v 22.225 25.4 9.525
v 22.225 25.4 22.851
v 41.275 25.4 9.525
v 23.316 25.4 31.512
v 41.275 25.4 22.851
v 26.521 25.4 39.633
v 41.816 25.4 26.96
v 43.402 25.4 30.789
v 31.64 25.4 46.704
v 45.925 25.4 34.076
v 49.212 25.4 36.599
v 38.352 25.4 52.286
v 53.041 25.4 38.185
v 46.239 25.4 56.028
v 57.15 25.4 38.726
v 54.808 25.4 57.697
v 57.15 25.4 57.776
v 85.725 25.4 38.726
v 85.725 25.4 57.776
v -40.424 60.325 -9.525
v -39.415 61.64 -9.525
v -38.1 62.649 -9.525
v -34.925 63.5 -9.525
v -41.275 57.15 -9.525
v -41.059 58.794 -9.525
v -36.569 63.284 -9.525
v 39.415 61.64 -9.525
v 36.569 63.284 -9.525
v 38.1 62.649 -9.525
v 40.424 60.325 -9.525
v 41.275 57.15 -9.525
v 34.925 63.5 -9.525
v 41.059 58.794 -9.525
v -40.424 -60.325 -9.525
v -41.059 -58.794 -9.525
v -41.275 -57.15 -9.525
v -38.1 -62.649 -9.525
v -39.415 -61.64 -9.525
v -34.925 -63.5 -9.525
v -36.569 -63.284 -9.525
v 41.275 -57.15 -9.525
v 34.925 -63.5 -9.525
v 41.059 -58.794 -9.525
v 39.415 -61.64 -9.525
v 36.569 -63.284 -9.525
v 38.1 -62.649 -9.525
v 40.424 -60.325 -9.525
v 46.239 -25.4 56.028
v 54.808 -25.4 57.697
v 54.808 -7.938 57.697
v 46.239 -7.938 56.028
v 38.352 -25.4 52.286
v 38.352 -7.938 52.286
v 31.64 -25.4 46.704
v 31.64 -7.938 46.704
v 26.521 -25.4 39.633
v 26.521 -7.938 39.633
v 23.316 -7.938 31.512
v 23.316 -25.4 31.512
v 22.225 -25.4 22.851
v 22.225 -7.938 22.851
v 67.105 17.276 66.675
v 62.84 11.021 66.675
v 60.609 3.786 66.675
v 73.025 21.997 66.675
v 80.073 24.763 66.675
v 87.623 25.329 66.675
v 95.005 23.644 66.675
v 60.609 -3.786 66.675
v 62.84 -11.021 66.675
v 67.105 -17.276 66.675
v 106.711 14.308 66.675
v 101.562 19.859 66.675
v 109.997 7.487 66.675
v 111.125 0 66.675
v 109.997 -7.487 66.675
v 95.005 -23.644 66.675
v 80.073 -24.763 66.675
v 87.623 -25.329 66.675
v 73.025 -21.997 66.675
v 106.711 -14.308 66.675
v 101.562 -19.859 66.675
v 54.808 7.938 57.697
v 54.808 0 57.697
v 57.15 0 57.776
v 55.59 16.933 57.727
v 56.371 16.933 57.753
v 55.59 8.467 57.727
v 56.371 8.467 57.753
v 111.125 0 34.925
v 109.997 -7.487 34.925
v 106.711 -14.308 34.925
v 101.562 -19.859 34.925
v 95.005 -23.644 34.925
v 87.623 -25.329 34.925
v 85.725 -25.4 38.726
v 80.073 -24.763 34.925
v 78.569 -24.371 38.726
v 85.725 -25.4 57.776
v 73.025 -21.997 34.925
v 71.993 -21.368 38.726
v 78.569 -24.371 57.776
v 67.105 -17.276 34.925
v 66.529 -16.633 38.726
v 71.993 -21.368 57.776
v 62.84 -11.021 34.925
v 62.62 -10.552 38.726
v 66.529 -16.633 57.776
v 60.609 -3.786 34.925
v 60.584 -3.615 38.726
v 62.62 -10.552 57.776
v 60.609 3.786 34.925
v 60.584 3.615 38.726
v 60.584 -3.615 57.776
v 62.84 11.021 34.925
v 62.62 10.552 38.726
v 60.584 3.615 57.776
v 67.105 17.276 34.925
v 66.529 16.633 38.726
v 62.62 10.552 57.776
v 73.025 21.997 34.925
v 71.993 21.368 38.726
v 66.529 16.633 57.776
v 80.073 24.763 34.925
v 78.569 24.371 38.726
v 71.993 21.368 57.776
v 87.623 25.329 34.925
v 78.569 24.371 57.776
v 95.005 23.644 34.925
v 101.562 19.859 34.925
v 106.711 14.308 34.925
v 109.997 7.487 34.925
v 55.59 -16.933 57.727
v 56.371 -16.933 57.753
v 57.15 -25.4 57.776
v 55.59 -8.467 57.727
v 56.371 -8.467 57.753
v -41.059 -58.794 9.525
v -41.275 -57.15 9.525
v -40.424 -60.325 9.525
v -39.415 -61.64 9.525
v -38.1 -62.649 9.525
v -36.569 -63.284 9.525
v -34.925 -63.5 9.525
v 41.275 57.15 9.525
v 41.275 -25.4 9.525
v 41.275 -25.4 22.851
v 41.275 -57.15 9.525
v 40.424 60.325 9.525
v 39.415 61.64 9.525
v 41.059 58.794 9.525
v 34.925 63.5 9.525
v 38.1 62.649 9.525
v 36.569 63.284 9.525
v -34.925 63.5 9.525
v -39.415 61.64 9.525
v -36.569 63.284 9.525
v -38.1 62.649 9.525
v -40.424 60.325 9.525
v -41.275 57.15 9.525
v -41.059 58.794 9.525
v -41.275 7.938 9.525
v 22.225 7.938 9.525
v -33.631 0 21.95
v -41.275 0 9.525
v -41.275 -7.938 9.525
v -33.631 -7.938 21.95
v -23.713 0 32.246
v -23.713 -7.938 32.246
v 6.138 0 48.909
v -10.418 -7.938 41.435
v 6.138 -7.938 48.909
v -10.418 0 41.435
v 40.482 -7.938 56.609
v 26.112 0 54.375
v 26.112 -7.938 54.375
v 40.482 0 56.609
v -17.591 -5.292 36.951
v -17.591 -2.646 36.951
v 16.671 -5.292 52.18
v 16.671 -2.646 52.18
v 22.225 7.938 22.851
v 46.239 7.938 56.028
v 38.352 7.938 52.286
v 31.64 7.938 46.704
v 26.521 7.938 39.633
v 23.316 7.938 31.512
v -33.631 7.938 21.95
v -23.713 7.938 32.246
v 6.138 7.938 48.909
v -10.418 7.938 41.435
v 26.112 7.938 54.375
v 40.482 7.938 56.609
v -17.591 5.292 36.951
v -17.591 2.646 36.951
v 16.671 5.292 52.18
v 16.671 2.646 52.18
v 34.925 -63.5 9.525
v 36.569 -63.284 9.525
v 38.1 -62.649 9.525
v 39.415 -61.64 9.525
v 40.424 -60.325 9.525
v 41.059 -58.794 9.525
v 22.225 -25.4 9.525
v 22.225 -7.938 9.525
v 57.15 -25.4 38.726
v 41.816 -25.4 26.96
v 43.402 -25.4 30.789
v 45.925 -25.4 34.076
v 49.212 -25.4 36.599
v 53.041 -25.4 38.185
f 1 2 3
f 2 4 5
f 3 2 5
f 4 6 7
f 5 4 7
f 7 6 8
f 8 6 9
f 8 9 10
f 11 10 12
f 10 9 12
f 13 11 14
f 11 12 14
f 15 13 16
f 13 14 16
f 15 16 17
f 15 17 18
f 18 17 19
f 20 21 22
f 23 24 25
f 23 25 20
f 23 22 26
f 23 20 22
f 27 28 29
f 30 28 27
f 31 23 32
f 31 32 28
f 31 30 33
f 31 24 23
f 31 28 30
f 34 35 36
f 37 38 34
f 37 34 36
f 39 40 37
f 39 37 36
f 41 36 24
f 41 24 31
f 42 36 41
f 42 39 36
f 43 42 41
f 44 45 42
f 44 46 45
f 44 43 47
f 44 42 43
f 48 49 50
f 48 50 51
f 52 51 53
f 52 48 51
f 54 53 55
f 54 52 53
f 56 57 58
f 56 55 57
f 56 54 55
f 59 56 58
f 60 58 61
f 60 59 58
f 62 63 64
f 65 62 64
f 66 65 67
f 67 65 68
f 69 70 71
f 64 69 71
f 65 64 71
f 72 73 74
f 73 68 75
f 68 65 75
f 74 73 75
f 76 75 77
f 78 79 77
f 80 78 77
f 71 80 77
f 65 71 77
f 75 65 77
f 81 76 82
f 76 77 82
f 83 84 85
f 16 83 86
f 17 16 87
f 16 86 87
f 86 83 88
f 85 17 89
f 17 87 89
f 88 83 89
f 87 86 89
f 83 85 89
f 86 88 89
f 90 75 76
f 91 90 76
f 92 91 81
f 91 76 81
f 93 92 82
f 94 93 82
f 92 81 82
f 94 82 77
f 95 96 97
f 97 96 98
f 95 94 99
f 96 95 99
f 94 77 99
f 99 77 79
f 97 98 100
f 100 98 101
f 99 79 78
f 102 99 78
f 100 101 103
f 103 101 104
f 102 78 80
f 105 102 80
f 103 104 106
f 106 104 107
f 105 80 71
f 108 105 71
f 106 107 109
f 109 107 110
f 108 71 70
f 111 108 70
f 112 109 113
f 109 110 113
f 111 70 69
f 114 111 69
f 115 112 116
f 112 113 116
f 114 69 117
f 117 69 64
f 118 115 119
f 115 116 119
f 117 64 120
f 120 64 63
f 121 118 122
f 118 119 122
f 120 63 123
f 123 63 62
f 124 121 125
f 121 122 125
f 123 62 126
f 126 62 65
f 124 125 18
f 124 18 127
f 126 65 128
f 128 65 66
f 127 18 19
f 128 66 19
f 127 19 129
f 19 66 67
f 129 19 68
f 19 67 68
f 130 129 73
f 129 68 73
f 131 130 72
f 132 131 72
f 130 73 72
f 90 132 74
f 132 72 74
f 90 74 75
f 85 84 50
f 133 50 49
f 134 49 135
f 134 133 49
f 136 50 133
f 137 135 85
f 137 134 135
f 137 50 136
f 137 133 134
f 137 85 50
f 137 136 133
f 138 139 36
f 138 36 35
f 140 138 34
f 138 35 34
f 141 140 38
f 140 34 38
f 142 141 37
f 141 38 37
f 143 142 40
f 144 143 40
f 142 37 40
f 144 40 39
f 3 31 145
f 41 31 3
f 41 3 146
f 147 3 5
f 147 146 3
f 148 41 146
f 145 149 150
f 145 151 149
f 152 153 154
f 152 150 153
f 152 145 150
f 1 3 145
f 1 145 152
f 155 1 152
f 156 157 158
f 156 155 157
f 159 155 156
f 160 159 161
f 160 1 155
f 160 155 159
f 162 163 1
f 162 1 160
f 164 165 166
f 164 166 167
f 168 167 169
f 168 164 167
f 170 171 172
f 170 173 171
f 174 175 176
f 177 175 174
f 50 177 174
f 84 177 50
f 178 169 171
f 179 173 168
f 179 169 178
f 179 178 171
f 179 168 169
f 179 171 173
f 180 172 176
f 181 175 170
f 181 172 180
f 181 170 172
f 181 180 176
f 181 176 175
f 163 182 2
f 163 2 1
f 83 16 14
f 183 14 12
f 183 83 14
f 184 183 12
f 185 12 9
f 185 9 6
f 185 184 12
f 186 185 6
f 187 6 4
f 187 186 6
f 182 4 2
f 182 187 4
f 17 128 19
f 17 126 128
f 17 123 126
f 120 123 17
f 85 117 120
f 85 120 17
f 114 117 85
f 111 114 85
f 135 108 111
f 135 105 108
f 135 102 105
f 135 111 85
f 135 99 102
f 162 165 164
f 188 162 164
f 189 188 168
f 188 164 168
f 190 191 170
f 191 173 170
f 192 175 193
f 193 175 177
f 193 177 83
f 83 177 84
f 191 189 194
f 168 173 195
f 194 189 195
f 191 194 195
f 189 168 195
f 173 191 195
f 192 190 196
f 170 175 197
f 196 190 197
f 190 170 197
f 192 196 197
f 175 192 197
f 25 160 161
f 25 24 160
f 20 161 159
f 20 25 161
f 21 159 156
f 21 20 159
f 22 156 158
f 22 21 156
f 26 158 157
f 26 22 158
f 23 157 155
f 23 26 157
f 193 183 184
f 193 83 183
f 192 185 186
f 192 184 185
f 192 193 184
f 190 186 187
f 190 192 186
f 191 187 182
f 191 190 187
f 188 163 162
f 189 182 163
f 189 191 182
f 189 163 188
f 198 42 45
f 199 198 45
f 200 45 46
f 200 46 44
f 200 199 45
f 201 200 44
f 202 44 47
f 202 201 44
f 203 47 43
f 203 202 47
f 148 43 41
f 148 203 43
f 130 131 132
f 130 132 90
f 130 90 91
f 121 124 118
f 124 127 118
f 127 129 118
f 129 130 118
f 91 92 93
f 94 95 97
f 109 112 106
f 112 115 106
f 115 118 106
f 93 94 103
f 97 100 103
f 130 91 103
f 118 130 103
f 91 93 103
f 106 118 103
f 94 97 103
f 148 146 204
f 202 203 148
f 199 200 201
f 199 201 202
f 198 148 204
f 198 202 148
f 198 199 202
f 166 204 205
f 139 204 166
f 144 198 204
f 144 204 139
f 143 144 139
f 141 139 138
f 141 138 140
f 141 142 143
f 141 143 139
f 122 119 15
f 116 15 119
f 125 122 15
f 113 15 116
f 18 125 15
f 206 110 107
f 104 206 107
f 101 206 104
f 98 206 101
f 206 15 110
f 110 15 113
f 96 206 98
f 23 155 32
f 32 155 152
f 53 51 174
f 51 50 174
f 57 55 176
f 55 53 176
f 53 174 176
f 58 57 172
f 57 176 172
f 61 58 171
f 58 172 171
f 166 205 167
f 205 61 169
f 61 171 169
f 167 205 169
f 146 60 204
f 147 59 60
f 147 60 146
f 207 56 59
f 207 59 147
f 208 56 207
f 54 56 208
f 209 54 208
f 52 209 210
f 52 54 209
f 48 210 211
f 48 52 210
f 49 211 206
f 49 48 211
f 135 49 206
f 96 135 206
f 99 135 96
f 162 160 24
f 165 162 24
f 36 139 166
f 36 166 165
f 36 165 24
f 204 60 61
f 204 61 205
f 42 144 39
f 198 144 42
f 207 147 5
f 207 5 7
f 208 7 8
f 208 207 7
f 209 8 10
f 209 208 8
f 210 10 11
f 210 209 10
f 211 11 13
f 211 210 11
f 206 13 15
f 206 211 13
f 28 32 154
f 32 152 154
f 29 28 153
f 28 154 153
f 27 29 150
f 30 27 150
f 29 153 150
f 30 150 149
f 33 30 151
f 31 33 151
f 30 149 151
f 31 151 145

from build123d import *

# Parameters (mm, degrees)
F1_DEPTH = 63.5
F0_W     = 25.4
F0_H     = 19.0500000358
F2_DEPTH = 25.4
F4_DEPTH = 7.9375
F5_R     = 6.35


with BuildPart() as f1:
    # F0 (on Front) → F1 (new body, symmetric)
    with BuildSketch(Plane.XZ):
        Polygon((22.2249999642, 9.525), (-41.275, 9.525), (-41.275, -9.525), (41.275, -9.525), (41.275, 9.525), align=None)
    extrude(amount=F1_DEPTH, both=True)

    # F0 (on Front) → F2 (join, symmetric)
    with BuildSketch(Plane.XZ):
        with BuildLine():
            Line((22.2249999642, 22.8510349691), (22.2249999642, 9.525))
            Line((22.2249999642, 9.525), (41.275, 9.525))
            Line((41.275, 9.525), (41.275, 22.8510349691))
            ThreePointArc((41.275, 22.8510349691), (45.9246798487, 34.0763551205), (57.15, 38.7260349691))
            Line((57.15, 38.7260349691), (60.325, 38.7260349691))
            Line((60.325, 38.7260349691), (60.325, 57.7760350049))
            Line((60.325, 57.7760350049), (57.15, 57.7760350049))
            add(Edge.make_bspline(
                [(54.8082230388, 57.6974366221), (55.5907182934, 57.7282388811), (56.3713995227, 57.7544053824), (57.15, 57.7760350049)],
                knots=[107.3950550145, 107.3950550145, 107.3950550145, 107.3950550145, 109.6158884653, 109.6158884653, 109.6158884653, 109.6158884653], degree=3))
            ThreePointArc((54.8082230388, 57.6974366221), (31.6397845173, 46.7044316564), (22.2249999642, 22.8510349691))
        make_face()
        with Locations((73.025, 48.251034987)):
            Rectangle(F0_W, F0_H)
    extrude(amount=F2_DEPTH, both=True)

    # F0 (on Front) → F3 (revolve)
    with BuildSketch(Plane.XZ):
        Polygon((85.725, 66.675), (85.725, 57.7760350049), (85.725, 38.7260349691), (85.725, 34.925), (111.125, 34.925), (111.125, 66.675), align=None)
    revolve(axis=Axis((85.725, 0, 50.8), (0, 0, -1)))

    # F0 (on Front) → F4 (join, symmetric)
    with BuildSketch(Plane.XZ):
        with BuildLine():
            add(Edge.make_bspline(
                [(-41.275, 9.525), (-25.1136724024, 43.8776656842), (16.9683206865, 56.2079011061), (54.8082230388, 57.6974366221)],
                knots=[0, 0, 0, 0, 107.3950550145, 107.3950550145, 107.3950550145, 107.3950550145], degree=3))
            Line((-41.275, 9.525), (22.2249999642, 9.525))
            Line((22.2249999642, 9.525), (22.2249999642, 22.8510349691))
            ThreePointArc((22.2249999642, 22.8510349691), (31.6397845173, 46.7044316564), (54.8082230388, 57.6974366221))
        make_face()
    extrude(amount=F4_DEPTH, both=True)

    # F5
    f5_edges = [f1.edges().sort_by_distance(p)[0] for p in [
        (41.275, 63.5, 0),
        (-41.275, 63.5, 0),
        (41.275, -63.5, 0),
        (-41.275, -63.5, 0),
    ]]
    fillet(f5_edges, radius=F5_R)


solid = f1.part
